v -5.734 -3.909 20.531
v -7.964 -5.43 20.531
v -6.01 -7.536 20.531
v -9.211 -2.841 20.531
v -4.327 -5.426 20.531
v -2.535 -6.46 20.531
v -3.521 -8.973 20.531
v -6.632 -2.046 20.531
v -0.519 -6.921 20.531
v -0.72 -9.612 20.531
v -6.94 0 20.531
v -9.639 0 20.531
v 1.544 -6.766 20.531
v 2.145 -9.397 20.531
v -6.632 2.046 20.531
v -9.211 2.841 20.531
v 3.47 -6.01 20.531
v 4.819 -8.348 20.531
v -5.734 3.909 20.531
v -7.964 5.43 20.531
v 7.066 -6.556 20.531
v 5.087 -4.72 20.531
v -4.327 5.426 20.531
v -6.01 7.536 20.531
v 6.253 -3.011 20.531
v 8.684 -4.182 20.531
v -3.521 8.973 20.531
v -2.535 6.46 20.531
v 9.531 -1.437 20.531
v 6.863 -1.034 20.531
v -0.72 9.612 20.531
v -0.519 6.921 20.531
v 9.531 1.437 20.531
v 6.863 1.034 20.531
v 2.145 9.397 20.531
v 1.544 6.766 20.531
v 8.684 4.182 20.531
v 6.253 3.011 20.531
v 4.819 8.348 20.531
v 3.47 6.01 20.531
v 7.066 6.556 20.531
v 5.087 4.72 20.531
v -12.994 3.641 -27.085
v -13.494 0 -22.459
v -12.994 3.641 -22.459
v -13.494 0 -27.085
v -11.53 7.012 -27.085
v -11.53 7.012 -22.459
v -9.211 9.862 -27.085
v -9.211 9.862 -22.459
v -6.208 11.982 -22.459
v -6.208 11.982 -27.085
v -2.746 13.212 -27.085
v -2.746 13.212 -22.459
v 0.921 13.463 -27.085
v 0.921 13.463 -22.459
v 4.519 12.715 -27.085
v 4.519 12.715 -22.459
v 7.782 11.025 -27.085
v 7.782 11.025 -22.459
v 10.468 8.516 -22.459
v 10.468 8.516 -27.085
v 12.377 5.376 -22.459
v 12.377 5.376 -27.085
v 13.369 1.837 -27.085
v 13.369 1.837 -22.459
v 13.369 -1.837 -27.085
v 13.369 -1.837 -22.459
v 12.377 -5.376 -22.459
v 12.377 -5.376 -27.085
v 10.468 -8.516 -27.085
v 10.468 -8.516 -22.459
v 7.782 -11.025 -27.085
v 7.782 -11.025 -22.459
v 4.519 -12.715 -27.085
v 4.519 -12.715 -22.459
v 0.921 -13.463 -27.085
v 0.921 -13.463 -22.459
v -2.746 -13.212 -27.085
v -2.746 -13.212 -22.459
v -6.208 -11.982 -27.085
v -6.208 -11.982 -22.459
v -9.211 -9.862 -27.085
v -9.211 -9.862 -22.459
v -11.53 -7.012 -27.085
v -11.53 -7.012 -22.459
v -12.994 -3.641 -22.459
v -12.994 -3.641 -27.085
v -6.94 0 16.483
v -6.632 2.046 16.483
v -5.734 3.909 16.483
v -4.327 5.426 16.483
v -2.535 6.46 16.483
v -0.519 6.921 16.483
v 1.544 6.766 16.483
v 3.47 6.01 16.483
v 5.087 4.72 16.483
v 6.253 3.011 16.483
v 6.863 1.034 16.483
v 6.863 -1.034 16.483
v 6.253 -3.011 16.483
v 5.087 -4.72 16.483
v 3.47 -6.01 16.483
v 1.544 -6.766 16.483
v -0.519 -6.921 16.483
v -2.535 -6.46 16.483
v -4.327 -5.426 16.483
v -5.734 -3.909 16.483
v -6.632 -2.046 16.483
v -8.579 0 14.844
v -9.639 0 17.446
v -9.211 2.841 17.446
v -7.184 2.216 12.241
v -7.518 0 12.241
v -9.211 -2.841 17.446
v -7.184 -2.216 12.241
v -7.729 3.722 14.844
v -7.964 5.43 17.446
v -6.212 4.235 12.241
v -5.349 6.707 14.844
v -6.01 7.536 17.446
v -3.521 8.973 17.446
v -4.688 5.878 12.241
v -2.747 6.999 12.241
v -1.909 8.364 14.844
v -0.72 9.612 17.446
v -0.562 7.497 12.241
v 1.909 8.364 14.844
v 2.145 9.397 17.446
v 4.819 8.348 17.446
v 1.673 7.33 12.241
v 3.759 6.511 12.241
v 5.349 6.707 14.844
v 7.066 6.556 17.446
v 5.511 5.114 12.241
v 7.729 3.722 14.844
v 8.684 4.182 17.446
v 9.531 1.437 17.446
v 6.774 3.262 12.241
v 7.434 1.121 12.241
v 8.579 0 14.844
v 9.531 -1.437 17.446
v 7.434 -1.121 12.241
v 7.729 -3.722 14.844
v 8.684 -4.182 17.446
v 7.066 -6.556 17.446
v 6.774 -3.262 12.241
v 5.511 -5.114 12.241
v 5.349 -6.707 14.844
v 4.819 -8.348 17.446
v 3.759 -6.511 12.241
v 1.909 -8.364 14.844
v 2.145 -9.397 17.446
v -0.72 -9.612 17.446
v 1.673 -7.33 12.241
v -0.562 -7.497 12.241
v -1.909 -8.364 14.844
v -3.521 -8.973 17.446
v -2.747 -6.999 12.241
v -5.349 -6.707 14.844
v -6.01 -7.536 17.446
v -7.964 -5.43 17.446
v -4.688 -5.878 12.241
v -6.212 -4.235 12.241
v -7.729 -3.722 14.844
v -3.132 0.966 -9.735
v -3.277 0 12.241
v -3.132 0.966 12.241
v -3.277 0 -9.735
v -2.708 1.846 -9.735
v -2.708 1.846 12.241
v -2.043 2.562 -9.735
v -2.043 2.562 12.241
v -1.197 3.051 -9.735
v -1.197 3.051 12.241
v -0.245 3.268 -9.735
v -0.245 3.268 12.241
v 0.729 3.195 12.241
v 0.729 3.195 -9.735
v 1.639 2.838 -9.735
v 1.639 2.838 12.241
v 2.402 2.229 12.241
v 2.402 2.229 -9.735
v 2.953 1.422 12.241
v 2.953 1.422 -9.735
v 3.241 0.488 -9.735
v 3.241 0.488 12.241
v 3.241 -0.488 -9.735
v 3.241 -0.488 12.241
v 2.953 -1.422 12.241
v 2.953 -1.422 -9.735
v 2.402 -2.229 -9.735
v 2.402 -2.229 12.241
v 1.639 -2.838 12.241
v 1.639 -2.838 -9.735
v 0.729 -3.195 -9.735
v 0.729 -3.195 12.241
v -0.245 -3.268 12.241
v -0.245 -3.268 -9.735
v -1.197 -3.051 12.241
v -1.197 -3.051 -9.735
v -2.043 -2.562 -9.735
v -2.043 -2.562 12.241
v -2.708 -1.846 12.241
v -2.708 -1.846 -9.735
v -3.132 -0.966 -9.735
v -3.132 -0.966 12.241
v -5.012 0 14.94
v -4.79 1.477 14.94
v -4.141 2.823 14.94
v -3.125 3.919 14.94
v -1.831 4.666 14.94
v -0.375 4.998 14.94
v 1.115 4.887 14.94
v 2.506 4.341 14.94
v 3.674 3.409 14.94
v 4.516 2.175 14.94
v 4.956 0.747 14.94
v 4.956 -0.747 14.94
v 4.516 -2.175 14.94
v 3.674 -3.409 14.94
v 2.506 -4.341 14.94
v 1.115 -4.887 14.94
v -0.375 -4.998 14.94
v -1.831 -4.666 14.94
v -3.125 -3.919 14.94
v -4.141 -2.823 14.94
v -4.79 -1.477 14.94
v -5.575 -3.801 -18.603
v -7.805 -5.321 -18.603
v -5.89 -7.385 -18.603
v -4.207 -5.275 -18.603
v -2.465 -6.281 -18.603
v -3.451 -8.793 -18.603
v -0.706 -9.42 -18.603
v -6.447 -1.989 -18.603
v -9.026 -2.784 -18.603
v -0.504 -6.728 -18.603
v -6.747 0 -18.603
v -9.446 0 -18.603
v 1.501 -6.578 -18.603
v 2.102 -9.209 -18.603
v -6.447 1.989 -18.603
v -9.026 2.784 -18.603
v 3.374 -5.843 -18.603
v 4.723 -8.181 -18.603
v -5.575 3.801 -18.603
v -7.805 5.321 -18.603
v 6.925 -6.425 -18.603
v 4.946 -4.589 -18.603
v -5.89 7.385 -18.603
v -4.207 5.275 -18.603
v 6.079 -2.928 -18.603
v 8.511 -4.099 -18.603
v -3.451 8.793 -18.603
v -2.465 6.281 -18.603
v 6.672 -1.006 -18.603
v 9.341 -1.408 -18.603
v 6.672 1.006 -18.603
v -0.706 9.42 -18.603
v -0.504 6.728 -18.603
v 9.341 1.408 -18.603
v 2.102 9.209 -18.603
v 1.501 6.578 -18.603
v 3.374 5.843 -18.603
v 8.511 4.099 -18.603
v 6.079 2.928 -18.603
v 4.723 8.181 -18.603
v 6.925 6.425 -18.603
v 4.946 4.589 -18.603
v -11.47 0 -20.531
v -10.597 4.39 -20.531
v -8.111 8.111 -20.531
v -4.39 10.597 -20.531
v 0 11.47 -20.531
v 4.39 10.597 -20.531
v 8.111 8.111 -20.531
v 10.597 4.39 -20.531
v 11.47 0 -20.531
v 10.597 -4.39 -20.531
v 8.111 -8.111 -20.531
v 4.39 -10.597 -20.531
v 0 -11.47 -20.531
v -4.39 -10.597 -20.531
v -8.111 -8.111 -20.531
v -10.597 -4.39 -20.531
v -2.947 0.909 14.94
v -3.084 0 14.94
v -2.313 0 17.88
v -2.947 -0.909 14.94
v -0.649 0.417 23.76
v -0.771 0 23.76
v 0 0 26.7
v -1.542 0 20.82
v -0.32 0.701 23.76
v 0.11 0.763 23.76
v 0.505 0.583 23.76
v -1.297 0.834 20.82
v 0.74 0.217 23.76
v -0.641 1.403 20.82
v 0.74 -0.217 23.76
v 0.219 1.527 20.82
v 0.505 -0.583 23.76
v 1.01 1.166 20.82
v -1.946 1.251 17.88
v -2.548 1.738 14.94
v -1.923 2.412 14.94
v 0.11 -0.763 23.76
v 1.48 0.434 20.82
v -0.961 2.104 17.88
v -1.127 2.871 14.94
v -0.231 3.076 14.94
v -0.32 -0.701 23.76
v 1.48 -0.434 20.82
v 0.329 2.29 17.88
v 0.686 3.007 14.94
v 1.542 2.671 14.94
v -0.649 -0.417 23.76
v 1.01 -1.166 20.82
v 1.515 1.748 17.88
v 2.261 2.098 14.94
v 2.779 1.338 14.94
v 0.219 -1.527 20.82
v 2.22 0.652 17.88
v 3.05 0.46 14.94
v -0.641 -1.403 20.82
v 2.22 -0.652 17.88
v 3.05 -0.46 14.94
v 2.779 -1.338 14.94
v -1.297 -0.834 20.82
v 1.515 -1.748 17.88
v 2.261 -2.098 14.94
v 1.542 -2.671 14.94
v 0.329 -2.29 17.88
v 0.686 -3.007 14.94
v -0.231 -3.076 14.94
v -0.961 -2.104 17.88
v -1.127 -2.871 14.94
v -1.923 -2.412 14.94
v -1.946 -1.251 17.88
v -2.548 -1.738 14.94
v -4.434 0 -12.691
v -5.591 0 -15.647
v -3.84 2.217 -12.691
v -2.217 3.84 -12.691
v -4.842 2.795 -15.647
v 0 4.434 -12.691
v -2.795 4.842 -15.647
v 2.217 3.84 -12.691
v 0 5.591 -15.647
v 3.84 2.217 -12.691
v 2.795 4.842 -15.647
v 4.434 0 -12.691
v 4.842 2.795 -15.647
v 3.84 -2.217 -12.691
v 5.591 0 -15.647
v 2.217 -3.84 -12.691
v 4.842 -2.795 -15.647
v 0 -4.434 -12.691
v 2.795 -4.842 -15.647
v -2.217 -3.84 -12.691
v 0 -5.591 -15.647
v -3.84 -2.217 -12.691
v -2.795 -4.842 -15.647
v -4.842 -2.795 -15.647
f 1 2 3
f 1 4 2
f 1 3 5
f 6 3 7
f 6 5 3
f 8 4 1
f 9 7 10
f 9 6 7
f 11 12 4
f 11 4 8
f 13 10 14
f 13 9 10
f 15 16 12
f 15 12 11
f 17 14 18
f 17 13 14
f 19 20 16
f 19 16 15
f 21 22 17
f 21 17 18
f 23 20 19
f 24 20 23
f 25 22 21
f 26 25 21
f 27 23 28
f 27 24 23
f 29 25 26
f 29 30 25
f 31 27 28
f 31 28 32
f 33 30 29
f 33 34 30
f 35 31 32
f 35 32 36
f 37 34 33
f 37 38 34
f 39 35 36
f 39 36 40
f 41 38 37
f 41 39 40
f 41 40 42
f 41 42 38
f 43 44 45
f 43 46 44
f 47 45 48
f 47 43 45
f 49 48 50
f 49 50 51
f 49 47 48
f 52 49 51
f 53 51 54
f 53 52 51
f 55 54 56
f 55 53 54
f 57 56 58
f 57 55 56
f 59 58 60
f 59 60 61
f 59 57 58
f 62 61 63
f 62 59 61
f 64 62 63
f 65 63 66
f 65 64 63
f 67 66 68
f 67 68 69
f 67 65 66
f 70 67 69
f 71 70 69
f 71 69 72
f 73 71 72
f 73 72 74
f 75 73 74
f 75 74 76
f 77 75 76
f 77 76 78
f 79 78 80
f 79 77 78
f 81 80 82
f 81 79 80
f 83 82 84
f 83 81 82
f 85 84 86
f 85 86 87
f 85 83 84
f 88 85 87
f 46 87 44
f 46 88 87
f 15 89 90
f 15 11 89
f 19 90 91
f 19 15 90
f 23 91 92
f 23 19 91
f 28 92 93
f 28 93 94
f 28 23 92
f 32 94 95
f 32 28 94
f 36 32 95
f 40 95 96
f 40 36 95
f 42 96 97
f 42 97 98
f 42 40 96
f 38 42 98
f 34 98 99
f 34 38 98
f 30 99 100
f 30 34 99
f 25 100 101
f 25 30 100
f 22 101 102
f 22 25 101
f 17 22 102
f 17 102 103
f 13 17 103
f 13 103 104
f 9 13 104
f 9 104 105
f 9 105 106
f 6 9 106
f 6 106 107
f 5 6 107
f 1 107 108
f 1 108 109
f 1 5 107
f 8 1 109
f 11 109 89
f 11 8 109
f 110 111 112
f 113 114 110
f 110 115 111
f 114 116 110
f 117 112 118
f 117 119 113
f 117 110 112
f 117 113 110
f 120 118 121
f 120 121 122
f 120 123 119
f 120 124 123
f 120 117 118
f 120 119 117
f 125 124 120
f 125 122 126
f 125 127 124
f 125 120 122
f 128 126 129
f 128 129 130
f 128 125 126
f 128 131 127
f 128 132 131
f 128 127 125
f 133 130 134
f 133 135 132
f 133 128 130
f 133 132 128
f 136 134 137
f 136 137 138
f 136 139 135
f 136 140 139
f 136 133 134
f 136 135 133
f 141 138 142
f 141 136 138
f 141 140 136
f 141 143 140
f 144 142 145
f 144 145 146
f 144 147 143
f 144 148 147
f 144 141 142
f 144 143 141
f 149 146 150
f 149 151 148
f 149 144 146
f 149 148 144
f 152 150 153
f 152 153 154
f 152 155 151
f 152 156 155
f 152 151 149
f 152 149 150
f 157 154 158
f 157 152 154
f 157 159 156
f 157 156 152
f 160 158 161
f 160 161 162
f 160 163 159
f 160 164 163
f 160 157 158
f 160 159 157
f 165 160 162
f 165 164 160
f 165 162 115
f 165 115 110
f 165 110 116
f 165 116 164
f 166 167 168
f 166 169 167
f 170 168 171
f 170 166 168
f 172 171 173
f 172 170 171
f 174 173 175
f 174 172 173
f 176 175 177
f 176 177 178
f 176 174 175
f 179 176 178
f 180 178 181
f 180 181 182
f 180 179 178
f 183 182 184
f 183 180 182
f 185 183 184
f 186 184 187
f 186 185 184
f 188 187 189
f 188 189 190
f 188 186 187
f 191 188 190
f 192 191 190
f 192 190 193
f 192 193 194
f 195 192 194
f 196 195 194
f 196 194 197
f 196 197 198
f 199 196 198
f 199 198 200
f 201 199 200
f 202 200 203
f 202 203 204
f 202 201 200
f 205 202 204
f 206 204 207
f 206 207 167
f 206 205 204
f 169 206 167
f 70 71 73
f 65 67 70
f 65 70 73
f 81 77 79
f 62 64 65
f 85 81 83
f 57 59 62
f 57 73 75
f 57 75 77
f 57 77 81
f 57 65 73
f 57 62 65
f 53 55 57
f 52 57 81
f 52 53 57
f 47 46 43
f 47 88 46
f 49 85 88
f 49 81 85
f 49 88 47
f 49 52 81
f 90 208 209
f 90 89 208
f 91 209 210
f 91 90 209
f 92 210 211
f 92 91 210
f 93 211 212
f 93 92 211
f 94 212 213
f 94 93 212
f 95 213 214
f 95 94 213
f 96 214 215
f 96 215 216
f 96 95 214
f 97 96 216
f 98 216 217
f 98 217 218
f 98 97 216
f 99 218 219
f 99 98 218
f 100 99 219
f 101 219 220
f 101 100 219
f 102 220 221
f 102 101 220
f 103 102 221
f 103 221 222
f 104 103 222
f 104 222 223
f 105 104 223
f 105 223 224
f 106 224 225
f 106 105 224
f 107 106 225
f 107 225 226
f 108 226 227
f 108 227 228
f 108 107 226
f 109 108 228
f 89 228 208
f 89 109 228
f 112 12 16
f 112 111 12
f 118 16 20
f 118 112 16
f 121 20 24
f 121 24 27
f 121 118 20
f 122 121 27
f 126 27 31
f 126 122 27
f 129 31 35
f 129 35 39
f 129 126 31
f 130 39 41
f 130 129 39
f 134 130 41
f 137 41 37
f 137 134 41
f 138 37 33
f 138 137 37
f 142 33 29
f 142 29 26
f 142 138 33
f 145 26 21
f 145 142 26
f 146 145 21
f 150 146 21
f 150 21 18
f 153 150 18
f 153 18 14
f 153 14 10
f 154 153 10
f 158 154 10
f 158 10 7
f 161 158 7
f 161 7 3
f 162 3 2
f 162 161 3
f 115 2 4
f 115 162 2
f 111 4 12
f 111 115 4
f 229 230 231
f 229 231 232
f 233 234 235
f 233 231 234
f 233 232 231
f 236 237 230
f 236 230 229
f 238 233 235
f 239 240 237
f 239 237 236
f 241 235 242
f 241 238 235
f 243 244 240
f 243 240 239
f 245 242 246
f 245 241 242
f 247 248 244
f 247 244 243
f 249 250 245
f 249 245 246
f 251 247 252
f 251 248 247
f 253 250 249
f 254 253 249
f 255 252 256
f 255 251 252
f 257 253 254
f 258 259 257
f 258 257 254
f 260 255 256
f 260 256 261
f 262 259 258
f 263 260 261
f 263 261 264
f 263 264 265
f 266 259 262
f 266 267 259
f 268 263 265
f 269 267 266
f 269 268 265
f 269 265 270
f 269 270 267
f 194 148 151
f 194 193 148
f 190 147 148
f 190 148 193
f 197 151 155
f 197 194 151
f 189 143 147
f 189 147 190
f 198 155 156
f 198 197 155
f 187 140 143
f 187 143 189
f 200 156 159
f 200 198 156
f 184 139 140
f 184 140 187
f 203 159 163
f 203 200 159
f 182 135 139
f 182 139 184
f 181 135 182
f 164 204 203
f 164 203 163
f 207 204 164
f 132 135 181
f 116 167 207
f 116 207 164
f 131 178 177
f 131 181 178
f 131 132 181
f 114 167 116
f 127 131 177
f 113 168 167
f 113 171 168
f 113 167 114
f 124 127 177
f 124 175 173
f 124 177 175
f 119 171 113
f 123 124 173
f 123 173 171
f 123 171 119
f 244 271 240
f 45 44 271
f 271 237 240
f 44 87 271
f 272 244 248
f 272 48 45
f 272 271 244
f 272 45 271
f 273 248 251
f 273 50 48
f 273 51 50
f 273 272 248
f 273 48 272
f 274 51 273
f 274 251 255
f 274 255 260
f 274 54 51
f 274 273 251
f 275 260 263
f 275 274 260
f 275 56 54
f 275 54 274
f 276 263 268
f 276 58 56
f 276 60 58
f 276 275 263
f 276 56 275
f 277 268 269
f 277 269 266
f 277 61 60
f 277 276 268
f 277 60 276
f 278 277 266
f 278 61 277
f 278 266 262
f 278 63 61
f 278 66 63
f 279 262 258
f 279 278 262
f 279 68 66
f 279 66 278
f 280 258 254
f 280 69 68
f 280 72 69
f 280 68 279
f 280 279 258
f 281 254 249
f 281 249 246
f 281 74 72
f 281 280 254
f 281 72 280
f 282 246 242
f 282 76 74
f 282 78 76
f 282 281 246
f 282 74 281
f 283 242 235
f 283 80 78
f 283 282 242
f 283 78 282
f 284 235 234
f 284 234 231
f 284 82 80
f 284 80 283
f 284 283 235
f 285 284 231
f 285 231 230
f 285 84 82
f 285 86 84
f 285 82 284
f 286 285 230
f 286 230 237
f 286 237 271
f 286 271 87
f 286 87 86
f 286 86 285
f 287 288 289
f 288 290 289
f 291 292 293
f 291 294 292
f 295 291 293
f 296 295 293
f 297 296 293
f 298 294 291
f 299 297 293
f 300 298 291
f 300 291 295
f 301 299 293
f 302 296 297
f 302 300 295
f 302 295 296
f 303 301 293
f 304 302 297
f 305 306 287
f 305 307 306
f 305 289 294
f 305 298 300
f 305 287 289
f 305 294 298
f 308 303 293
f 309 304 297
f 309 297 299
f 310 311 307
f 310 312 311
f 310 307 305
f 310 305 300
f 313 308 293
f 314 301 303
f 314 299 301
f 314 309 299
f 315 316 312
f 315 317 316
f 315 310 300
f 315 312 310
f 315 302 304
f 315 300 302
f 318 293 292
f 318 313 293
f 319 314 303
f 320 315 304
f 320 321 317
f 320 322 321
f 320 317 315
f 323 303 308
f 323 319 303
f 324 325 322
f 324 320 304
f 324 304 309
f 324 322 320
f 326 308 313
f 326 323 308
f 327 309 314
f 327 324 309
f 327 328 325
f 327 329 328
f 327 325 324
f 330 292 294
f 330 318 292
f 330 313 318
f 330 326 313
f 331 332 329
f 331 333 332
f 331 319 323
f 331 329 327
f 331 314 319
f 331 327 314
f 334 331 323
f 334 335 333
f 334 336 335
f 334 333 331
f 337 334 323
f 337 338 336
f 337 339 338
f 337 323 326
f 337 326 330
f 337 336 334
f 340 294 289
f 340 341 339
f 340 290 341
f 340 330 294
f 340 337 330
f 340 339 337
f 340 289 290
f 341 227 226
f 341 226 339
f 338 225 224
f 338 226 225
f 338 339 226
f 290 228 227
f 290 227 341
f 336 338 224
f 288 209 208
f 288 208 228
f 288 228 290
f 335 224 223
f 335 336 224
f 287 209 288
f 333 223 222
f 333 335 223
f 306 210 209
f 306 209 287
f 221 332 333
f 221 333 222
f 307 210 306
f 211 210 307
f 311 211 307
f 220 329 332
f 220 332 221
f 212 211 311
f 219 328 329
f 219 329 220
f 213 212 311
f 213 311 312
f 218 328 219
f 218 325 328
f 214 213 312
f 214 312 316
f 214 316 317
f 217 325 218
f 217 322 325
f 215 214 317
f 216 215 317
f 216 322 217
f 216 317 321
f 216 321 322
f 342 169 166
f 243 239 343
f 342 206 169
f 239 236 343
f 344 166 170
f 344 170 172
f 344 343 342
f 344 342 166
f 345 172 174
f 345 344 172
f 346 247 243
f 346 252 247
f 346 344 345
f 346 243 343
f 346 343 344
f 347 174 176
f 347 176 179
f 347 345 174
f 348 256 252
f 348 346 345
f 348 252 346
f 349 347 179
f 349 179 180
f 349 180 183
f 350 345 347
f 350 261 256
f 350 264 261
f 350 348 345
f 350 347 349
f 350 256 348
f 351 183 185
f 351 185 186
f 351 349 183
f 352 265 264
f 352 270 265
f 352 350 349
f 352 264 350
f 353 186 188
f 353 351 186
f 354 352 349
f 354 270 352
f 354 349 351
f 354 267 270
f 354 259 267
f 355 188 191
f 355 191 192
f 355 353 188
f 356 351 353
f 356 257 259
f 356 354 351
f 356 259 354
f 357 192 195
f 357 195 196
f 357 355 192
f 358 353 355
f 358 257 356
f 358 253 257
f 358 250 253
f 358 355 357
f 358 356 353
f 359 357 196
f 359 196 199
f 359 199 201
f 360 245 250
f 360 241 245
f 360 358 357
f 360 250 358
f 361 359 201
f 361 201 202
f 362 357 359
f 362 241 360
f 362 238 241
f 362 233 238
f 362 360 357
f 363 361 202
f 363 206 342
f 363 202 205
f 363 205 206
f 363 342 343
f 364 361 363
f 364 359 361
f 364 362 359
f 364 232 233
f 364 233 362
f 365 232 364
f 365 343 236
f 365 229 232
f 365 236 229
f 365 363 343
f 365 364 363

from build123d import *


with BuildPart() as f1:
    # F0 (on Front) → F1 (revolve)
    with BuildSketch(Plane.XZ):
        Polygon((-13.494493, -27.085373), (0, -27.085373), (0, 26.699817), (-3.084456, 14.940332), (-5.01224, 14.940332), (-6.940024, 16.482558), (-6.940024, 20.530906), (-9.638923, 20.530906), (-9.638923, 17.446451), (-7.51836, 12.241432), (-3.277234, 12.241432), (-3.277234, -9.735312), (-6.747246, -18.603122), (-9.446145, -18.603122), (-13.494493, -22.458691), align=None)
    revolve(axis=Axis((0, 0, -0.192778), (0, 0, -1)))


solid = f1.part
